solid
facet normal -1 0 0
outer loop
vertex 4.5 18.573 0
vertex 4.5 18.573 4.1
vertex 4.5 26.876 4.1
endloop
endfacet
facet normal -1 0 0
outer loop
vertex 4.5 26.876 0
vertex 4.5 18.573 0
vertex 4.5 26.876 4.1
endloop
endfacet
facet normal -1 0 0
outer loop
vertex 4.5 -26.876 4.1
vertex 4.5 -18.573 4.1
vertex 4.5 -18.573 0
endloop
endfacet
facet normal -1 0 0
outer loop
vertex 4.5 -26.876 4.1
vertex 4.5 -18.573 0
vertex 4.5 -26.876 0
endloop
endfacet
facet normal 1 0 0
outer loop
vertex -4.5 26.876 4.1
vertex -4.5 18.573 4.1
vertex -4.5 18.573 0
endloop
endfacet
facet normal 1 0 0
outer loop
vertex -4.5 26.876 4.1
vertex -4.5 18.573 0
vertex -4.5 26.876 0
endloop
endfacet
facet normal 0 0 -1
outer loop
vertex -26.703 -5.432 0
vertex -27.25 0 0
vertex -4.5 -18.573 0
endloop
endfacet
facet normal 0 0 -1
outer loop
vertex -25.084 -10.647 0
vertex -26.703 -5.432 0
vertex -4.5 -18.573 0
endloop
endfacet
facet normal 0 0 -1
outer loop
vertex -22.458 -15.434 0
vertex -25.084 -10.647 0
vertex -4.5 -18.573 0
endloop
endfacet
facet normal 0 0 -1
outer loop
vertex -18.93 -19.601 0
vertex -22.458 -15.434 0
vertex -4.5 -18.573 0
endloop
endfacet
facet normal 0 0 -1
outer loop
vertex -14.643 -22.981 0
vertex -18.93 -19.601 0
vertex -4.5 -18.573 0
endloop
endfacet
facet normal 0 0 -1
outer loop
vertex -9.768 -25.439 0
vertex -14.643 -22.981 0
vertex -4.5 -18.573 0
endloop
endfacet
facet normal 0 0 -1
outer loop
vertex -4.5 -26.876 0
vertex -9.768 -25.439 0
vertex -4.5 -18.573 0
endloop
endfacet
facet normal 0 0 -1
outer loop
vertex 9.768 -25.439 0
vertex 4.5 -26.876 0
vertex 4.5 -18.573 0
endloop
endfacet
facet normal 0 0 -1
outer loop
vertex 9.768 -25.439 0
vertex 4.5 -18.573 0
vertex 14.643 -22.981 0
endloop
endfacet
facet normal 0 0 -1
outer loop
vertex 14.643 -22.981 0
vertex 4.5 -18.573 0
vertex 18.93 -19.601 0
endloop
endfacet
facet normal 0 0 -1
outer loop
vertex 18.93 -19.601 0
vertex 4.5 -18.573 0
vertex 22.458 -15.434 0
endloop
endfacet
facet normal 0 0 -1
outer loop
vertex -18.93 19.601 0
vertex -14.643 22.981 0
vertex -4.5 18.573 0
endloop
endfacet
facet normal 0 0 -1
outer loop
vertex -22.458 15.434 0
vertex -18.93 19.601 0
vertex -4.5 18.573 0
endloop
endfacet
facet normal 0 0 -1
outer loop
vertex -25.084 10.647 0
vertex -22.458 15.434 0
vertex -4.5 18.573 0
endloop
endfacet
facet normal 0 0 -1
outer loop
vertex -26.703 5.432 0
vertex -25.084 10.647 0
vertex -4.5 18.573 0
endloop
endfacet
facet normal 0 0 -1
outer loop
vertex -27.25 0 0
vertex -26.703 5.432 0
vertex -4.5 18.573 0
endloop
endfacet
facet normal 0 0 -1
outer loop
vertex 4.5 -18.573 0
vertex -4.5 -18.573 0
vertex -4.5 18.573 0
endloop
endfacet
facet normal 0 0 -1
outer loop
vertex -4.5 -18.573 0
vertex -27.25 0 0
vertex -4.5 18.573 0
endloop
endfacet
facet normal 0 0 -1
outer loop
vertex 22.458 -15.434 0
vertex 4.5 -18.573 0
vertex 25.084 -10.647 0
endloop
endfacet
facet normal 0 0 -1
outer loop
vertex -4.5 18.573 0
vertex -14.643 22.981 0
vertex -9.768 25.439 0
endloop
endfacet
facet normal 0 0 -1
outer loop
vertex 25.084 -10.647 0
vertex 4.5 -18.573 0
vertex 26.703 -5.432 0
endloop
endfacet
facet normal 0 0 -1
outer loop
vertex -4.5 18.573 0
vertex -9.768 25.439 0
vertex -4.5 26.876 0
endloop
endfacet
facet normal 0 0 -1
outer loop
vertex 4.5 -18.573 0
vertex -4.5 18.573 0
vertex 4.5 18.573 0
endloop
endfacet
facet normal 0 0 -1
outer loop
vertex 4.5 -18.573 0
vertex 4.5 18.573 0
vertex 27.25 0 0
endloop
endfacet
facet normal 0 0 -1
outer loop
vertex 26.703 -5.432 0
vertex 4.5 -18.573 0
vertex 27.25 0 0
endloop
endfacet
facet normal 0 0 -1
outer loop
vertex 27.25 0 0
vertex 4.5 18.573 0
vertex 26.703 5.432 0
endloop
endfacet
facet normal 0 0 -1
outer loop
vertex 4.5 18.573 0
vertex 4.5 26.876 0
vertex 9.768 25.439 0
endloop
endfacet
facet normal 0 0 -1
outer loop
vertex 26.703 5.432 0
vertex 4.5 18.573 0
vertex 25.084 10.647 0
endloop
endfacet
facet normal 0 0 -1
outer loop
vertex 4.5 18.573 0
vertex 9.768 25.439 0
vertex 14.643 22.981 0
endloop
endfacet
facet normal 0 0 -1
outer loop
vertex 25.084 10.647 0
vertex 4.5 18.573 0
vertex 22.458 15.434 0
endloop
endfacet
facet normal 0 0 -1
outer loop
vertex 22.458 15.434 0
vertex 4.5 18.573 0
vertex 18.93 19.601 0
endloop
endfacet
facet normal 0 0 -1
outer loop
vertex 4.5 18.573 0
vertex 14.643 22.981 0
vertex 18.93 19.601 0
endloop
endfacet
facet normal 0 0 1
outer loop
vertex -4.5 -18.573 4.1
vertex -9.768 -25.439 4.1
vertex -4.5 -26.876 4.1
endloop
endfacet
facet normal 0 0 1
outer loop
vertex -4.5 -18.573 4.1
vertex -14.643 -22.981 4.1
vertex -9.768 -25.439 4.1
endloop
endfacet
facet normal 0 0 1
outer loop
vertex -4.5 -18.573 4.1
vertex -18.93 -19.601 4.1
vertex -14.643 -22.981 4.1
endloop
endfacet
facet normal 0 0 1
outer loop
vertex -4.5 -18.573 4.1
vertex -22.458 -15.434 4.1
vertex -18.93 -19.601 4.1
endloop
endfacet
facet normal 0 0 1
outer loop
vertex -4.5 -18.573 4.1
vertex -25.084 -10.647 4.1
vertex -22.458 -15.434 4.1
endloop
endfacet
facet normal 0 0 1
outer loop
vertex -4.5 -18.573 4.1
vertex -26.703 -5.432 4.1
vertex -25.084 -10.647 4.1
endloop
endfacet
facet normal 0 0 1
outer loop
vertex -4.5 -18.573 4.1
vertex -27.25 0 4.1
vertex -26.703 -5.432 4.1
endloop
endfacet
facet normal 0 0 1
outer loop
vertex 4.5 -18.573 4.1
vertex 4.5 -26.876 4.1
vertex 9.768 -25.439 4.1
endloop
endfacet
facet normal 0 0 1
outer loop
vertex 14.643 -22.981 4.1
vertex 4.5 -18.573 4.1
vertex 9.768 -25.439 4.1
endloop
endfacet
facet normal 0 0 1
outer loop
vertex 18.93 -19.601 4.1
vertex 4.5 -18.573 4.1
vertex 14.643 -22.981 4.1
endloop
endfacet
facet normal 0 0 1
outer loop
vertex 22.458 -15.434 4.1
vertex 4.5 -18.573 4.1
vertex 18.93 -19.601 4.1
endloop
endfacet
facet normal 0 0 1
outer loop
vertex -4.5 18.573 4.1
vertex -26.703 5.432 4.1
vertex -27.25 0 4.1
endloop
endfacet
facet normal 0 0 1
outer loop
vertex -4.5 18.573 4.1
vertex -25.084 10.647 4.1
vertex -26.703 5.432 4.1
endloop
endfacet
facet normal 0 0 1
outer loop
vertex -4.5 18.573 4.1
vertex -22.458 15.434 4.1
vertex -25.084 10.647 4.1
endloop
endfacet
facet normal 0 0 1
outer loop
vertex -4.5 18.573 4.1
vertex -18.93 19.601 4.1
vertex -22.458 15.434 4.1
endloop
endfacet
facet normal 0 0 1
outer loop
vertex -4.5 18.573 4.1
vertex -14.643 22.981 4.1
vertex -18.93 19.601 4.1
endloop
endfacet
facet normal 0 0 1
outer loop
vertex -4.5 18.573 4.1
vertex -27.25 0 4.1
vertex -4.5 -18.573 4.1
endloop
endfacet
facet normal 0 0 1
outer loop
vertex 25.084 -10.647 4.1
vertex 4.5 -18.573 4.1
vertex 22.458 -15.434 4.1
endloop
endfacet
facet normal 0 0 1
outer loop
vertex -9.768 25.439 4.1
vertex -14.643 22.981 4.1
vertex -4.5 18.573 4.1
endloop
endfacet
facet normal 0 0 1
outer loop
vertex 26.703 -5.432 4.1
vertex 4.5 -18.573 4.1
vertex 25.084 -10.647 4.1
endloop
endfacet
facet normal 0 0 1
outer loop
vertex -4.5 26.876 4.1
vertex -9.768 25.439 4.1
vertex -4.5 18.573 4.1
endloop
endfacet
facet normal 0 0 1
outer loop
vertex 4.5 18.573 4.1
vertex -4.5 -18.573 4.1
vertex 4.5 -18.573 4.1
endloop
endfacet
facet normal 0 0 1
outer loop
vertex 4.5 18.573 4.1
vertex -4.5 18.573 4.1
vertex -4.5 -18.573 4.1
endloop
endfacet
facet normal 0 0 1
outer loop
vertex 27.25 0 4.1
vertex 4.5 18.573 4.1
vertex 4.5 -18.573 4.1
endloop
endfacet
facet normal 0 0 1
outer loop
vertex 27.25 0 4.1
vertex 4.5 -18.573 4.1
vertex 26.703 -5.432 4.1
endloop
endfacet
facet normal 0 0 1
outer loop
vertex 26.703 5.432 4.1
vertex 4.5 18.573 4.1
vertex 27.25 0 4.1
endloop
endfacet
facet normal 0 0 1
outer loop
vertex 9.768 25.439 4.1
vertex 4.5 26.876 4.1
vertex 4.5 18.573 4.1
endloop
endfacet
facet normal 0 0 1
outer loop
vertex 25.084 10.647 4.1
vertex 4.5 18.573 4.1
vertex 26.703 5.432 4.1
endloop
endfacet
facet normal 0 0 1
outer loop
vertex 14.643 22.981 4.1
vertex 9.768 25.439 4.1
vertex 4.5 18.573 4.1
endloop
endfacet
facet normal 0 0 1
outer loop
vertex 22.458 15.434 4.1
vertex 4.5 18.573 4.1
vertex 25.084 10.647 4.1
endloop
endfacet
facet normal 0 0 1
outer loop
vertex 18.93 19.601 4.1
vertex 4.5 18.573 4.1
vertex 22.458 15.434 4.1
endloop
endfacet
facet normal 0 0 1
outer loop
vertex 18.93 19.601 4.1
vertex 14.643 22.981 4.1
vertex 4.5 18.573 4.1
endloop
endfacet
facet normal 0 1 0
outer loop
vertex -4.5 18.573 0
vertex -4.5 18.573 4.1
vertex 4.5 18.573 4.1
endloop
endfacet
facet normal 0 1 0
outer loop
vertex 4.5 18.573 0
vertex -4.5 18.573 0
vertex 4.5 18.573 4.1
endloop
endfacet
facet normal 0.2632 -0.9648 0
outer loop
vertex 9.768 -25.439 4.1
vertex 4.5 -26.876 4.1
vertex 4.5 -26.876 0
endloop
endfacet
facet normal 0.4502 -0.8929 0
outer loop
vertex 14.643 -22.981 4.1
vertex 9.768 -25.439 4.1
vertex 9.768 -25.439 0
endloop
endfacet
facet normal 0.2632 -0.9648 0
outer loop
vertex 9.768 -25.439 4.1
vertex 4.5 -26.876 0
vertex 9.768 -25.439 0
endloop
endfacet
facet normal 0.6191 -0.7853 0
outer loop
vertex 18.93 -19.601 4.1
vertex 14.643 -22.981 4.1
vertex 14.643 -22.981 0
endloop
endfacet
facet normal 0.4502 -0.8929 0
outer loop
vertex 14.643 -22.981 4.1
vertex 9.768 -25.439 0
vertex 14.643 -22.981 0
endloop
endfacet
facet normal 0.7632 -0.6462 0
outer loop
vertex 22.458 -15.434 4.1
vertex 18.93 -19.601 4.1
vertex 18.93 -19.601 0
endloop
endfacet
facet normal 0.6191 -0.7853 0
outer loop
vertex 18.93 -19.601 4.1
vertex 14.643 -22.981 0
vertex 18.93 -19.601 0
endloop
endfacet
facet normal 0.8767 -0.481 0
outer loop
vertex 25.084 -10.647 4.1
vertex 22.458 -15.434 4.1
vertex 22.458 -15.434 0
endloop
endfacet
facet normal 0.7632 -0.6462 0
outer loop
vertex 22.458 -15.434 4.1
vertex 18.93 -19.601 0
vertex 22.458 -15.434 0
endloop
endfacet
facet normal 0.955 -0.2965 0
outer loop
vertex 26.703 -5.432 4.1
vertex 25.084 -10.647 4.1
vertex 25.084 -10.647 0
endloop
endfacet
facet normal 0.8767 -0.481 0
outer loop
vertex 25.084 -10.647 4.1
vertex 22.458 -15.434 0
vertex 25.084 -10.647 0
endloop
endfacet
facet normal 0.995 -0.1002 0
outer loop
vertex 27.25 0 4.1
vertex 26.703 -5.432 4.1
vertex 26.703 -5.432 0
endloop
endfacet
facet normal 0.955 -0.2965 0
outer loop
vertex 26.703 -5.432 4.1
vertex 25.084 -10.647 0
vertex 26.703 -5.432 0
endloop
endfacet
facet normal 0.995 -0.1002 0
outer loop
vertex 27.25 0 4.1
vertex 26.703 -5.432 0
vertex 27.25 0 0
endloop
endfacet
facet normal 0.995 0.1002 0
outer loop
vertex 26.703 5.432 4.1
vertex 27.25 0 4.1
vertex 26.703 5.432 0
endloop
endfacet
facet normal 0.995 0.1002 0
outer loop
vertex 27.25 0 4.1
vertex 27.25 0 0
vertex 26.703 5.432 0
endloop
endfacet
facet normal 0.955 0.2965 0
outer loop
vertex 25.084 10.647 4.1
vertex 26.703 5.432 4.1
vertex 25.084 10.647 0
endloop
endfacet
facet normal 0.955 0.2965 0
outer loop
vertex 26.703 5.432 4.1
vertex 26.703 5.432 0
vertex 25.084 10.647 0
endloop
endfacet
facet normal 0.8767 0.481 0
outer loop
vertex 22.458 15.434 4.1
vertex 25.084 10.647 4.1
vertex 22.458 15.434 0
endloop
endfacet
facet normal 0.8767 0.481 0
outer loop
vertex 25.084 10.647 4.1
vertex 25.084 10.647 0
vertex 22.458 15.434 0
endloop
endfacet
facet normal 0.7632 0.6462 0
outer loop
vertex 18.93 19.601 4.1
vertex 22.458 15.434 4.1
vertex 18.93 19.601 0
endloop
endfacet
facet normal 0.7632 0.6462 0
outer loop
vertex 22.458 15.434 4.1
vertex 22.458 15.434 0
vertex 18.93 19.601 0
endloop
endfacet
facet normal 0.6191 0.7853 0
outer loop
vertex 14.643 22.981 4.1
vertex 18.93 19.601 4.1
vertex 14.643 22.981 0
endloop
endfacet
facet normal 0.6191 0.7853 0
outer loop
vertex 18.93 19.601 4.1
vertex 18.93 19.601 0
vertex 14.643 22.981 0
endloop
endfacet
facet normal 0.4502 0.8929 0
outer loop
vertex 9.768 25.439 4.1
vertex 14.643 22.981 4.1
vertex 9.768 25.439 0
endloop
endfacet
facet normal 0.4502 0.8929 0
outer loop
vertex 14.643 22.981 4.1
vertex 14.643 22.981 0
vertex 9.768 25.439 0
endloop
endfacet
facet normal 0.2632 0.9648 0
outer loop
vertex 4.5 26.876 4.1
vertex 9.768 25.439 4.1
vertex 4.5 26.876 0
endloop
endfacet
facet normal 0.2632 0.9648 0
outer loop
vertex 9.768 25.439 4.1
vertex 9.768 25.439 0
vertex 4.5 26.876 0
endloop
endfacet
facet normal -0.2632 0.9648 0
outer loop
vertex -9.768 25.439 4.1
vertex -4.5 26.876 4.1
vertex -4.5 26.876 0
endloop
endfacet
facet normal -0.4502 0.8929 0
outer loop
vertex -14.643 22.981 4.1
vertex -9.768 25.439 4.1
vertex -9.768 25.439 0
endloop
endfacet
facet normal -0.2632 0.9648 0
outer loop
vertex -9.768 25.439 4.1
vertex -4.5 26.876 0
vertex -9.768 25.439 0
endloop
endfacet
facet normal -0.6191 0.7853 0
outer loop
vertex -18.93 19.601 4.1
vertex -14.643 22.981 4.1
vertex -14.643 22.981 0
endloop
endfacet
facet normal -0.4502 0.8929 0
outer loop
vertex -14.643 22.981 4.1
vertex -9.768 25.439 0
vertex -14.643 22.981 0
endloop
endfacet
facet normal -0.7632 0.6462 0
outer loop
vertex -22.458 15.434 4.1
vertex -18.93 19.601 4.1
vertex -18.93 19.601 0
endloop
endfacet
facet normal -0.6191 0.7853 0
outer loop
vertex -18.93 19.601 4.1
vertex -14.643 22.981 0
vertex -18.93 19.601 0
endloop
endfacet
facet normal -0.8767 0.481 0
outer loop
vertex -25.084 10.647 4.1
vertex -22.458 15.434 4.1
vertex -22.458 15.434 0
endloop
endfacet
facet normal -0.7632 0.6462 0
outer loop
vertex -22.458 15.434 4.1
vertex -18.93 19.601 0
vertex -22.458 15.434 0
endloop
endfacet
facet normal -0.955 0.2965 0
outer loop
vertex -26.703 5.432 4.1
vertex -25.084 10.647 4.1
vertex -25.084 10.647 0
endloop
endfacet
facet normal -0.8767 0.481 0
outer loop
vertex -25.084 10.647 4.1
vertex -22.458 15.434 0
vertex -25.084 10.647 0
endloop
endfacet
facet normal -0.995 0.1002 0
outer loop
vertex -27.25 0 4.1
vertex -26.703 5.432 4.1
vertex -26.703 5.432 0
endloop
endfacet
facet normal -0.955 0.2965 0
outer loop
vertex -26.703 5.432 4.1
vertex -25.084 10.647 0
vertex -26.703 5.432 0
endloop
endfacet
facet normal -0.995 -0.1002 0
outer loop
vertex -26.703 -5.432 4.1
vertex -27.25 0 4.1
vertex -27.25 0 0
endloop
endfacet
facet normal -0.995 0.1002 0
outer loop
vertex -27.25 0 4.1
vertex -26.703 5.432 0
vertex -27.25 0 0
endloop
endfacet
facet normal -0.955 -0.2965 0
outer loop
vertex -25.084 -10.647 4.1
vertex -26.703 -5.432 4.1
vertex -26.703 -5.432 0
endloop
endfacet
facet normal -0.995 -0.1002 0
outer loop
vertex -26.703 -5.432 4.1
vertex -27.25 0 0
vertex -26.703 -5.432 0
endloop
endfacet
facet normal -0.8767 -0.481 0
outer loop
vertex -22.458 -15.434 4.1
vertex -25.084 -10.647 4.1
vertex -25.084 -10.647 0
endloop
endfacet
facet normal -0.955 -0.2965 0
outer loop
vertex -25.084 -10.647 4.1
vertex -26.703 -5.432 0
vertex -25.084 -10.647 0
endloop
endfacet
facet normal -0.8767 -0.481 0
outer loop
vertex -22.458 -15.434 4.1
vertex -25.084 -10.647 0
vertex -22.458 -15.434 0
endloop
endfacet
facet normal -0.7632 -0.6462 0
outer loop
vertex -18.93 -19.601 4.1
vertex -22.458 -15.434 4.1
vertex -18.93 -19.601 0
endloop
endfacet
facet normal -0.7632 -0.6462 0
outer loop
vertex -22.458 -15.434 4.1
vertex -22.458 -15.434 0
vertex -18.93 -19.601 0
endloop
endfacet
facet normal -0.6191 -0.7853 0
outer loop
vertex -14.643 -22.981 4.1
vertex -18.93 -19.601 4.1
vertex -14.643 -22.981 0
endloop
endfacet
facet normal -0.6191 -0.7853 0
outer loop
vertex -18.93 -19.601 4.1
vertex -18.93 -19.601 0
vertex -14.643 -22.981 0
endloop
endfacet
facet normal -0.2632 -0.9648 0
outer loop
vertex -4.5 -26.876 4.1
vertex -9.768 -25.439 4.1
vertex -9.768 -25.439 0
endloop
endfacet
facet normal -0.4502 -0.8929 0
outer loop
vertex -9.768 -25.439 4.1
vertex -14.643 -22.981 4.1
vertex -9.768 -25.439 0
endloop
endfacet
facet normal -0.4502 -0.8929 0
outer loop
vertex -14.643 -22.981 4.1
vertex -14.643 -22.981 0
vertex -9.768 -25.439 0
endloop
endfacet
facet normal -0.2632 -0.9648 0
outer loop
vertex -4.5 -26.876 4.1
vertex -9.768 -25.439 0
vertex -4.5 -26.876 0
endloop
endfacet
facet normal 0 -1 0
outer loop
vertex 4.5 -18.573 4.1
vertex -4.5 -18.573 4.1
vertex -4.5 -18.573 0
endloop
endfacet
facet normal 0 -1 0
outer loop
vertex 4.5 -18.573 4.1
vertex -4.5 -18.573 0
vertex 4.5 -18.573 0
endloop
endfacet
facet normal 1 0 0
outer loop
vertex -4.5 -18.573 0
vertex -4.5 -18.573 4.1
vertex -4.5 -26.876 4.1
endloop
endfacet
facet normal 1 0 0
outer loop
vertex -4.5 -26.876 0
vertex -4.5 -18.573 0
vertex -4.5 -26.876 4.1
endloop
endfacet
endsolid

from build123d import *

# Parameters (mm, degrees)
SKETCH_R     = 27.25
PAD_DEPTH    = 4.1
SKETCH001_W  = 9
SKETCH001_H  = 9
POCKET_DEPTH = 5


with BuildPart() as part:
    # Sketch → Pad (new body)
    with BuildSketch(Plane.XY):
        Circle(SKETCH_R)
    extrude(amount=PAD_DEPTH)

    # Sketch001 (on DatumPlane) → Pocket (cut)
    with BuildSketch(Plane.XY.offset(4.1)):
        with Locations((0, 23.072699)):
            Rectangle(SKETCH001_W, SKETCH001_H)
    pocket = extrude(amount=-POCKET_DEPTH, mode=Mode.SUBTRACT)

    # Mirrored: Pocket across Sketch001 H_Axis
    add(pocket.mirror(Plane(origin=(0, 0, 4.1), x_dir=(0, 0, 1), z_dir=(0, 1, 0))), mode=Mode.SUBTRACT)


solid = part.part
